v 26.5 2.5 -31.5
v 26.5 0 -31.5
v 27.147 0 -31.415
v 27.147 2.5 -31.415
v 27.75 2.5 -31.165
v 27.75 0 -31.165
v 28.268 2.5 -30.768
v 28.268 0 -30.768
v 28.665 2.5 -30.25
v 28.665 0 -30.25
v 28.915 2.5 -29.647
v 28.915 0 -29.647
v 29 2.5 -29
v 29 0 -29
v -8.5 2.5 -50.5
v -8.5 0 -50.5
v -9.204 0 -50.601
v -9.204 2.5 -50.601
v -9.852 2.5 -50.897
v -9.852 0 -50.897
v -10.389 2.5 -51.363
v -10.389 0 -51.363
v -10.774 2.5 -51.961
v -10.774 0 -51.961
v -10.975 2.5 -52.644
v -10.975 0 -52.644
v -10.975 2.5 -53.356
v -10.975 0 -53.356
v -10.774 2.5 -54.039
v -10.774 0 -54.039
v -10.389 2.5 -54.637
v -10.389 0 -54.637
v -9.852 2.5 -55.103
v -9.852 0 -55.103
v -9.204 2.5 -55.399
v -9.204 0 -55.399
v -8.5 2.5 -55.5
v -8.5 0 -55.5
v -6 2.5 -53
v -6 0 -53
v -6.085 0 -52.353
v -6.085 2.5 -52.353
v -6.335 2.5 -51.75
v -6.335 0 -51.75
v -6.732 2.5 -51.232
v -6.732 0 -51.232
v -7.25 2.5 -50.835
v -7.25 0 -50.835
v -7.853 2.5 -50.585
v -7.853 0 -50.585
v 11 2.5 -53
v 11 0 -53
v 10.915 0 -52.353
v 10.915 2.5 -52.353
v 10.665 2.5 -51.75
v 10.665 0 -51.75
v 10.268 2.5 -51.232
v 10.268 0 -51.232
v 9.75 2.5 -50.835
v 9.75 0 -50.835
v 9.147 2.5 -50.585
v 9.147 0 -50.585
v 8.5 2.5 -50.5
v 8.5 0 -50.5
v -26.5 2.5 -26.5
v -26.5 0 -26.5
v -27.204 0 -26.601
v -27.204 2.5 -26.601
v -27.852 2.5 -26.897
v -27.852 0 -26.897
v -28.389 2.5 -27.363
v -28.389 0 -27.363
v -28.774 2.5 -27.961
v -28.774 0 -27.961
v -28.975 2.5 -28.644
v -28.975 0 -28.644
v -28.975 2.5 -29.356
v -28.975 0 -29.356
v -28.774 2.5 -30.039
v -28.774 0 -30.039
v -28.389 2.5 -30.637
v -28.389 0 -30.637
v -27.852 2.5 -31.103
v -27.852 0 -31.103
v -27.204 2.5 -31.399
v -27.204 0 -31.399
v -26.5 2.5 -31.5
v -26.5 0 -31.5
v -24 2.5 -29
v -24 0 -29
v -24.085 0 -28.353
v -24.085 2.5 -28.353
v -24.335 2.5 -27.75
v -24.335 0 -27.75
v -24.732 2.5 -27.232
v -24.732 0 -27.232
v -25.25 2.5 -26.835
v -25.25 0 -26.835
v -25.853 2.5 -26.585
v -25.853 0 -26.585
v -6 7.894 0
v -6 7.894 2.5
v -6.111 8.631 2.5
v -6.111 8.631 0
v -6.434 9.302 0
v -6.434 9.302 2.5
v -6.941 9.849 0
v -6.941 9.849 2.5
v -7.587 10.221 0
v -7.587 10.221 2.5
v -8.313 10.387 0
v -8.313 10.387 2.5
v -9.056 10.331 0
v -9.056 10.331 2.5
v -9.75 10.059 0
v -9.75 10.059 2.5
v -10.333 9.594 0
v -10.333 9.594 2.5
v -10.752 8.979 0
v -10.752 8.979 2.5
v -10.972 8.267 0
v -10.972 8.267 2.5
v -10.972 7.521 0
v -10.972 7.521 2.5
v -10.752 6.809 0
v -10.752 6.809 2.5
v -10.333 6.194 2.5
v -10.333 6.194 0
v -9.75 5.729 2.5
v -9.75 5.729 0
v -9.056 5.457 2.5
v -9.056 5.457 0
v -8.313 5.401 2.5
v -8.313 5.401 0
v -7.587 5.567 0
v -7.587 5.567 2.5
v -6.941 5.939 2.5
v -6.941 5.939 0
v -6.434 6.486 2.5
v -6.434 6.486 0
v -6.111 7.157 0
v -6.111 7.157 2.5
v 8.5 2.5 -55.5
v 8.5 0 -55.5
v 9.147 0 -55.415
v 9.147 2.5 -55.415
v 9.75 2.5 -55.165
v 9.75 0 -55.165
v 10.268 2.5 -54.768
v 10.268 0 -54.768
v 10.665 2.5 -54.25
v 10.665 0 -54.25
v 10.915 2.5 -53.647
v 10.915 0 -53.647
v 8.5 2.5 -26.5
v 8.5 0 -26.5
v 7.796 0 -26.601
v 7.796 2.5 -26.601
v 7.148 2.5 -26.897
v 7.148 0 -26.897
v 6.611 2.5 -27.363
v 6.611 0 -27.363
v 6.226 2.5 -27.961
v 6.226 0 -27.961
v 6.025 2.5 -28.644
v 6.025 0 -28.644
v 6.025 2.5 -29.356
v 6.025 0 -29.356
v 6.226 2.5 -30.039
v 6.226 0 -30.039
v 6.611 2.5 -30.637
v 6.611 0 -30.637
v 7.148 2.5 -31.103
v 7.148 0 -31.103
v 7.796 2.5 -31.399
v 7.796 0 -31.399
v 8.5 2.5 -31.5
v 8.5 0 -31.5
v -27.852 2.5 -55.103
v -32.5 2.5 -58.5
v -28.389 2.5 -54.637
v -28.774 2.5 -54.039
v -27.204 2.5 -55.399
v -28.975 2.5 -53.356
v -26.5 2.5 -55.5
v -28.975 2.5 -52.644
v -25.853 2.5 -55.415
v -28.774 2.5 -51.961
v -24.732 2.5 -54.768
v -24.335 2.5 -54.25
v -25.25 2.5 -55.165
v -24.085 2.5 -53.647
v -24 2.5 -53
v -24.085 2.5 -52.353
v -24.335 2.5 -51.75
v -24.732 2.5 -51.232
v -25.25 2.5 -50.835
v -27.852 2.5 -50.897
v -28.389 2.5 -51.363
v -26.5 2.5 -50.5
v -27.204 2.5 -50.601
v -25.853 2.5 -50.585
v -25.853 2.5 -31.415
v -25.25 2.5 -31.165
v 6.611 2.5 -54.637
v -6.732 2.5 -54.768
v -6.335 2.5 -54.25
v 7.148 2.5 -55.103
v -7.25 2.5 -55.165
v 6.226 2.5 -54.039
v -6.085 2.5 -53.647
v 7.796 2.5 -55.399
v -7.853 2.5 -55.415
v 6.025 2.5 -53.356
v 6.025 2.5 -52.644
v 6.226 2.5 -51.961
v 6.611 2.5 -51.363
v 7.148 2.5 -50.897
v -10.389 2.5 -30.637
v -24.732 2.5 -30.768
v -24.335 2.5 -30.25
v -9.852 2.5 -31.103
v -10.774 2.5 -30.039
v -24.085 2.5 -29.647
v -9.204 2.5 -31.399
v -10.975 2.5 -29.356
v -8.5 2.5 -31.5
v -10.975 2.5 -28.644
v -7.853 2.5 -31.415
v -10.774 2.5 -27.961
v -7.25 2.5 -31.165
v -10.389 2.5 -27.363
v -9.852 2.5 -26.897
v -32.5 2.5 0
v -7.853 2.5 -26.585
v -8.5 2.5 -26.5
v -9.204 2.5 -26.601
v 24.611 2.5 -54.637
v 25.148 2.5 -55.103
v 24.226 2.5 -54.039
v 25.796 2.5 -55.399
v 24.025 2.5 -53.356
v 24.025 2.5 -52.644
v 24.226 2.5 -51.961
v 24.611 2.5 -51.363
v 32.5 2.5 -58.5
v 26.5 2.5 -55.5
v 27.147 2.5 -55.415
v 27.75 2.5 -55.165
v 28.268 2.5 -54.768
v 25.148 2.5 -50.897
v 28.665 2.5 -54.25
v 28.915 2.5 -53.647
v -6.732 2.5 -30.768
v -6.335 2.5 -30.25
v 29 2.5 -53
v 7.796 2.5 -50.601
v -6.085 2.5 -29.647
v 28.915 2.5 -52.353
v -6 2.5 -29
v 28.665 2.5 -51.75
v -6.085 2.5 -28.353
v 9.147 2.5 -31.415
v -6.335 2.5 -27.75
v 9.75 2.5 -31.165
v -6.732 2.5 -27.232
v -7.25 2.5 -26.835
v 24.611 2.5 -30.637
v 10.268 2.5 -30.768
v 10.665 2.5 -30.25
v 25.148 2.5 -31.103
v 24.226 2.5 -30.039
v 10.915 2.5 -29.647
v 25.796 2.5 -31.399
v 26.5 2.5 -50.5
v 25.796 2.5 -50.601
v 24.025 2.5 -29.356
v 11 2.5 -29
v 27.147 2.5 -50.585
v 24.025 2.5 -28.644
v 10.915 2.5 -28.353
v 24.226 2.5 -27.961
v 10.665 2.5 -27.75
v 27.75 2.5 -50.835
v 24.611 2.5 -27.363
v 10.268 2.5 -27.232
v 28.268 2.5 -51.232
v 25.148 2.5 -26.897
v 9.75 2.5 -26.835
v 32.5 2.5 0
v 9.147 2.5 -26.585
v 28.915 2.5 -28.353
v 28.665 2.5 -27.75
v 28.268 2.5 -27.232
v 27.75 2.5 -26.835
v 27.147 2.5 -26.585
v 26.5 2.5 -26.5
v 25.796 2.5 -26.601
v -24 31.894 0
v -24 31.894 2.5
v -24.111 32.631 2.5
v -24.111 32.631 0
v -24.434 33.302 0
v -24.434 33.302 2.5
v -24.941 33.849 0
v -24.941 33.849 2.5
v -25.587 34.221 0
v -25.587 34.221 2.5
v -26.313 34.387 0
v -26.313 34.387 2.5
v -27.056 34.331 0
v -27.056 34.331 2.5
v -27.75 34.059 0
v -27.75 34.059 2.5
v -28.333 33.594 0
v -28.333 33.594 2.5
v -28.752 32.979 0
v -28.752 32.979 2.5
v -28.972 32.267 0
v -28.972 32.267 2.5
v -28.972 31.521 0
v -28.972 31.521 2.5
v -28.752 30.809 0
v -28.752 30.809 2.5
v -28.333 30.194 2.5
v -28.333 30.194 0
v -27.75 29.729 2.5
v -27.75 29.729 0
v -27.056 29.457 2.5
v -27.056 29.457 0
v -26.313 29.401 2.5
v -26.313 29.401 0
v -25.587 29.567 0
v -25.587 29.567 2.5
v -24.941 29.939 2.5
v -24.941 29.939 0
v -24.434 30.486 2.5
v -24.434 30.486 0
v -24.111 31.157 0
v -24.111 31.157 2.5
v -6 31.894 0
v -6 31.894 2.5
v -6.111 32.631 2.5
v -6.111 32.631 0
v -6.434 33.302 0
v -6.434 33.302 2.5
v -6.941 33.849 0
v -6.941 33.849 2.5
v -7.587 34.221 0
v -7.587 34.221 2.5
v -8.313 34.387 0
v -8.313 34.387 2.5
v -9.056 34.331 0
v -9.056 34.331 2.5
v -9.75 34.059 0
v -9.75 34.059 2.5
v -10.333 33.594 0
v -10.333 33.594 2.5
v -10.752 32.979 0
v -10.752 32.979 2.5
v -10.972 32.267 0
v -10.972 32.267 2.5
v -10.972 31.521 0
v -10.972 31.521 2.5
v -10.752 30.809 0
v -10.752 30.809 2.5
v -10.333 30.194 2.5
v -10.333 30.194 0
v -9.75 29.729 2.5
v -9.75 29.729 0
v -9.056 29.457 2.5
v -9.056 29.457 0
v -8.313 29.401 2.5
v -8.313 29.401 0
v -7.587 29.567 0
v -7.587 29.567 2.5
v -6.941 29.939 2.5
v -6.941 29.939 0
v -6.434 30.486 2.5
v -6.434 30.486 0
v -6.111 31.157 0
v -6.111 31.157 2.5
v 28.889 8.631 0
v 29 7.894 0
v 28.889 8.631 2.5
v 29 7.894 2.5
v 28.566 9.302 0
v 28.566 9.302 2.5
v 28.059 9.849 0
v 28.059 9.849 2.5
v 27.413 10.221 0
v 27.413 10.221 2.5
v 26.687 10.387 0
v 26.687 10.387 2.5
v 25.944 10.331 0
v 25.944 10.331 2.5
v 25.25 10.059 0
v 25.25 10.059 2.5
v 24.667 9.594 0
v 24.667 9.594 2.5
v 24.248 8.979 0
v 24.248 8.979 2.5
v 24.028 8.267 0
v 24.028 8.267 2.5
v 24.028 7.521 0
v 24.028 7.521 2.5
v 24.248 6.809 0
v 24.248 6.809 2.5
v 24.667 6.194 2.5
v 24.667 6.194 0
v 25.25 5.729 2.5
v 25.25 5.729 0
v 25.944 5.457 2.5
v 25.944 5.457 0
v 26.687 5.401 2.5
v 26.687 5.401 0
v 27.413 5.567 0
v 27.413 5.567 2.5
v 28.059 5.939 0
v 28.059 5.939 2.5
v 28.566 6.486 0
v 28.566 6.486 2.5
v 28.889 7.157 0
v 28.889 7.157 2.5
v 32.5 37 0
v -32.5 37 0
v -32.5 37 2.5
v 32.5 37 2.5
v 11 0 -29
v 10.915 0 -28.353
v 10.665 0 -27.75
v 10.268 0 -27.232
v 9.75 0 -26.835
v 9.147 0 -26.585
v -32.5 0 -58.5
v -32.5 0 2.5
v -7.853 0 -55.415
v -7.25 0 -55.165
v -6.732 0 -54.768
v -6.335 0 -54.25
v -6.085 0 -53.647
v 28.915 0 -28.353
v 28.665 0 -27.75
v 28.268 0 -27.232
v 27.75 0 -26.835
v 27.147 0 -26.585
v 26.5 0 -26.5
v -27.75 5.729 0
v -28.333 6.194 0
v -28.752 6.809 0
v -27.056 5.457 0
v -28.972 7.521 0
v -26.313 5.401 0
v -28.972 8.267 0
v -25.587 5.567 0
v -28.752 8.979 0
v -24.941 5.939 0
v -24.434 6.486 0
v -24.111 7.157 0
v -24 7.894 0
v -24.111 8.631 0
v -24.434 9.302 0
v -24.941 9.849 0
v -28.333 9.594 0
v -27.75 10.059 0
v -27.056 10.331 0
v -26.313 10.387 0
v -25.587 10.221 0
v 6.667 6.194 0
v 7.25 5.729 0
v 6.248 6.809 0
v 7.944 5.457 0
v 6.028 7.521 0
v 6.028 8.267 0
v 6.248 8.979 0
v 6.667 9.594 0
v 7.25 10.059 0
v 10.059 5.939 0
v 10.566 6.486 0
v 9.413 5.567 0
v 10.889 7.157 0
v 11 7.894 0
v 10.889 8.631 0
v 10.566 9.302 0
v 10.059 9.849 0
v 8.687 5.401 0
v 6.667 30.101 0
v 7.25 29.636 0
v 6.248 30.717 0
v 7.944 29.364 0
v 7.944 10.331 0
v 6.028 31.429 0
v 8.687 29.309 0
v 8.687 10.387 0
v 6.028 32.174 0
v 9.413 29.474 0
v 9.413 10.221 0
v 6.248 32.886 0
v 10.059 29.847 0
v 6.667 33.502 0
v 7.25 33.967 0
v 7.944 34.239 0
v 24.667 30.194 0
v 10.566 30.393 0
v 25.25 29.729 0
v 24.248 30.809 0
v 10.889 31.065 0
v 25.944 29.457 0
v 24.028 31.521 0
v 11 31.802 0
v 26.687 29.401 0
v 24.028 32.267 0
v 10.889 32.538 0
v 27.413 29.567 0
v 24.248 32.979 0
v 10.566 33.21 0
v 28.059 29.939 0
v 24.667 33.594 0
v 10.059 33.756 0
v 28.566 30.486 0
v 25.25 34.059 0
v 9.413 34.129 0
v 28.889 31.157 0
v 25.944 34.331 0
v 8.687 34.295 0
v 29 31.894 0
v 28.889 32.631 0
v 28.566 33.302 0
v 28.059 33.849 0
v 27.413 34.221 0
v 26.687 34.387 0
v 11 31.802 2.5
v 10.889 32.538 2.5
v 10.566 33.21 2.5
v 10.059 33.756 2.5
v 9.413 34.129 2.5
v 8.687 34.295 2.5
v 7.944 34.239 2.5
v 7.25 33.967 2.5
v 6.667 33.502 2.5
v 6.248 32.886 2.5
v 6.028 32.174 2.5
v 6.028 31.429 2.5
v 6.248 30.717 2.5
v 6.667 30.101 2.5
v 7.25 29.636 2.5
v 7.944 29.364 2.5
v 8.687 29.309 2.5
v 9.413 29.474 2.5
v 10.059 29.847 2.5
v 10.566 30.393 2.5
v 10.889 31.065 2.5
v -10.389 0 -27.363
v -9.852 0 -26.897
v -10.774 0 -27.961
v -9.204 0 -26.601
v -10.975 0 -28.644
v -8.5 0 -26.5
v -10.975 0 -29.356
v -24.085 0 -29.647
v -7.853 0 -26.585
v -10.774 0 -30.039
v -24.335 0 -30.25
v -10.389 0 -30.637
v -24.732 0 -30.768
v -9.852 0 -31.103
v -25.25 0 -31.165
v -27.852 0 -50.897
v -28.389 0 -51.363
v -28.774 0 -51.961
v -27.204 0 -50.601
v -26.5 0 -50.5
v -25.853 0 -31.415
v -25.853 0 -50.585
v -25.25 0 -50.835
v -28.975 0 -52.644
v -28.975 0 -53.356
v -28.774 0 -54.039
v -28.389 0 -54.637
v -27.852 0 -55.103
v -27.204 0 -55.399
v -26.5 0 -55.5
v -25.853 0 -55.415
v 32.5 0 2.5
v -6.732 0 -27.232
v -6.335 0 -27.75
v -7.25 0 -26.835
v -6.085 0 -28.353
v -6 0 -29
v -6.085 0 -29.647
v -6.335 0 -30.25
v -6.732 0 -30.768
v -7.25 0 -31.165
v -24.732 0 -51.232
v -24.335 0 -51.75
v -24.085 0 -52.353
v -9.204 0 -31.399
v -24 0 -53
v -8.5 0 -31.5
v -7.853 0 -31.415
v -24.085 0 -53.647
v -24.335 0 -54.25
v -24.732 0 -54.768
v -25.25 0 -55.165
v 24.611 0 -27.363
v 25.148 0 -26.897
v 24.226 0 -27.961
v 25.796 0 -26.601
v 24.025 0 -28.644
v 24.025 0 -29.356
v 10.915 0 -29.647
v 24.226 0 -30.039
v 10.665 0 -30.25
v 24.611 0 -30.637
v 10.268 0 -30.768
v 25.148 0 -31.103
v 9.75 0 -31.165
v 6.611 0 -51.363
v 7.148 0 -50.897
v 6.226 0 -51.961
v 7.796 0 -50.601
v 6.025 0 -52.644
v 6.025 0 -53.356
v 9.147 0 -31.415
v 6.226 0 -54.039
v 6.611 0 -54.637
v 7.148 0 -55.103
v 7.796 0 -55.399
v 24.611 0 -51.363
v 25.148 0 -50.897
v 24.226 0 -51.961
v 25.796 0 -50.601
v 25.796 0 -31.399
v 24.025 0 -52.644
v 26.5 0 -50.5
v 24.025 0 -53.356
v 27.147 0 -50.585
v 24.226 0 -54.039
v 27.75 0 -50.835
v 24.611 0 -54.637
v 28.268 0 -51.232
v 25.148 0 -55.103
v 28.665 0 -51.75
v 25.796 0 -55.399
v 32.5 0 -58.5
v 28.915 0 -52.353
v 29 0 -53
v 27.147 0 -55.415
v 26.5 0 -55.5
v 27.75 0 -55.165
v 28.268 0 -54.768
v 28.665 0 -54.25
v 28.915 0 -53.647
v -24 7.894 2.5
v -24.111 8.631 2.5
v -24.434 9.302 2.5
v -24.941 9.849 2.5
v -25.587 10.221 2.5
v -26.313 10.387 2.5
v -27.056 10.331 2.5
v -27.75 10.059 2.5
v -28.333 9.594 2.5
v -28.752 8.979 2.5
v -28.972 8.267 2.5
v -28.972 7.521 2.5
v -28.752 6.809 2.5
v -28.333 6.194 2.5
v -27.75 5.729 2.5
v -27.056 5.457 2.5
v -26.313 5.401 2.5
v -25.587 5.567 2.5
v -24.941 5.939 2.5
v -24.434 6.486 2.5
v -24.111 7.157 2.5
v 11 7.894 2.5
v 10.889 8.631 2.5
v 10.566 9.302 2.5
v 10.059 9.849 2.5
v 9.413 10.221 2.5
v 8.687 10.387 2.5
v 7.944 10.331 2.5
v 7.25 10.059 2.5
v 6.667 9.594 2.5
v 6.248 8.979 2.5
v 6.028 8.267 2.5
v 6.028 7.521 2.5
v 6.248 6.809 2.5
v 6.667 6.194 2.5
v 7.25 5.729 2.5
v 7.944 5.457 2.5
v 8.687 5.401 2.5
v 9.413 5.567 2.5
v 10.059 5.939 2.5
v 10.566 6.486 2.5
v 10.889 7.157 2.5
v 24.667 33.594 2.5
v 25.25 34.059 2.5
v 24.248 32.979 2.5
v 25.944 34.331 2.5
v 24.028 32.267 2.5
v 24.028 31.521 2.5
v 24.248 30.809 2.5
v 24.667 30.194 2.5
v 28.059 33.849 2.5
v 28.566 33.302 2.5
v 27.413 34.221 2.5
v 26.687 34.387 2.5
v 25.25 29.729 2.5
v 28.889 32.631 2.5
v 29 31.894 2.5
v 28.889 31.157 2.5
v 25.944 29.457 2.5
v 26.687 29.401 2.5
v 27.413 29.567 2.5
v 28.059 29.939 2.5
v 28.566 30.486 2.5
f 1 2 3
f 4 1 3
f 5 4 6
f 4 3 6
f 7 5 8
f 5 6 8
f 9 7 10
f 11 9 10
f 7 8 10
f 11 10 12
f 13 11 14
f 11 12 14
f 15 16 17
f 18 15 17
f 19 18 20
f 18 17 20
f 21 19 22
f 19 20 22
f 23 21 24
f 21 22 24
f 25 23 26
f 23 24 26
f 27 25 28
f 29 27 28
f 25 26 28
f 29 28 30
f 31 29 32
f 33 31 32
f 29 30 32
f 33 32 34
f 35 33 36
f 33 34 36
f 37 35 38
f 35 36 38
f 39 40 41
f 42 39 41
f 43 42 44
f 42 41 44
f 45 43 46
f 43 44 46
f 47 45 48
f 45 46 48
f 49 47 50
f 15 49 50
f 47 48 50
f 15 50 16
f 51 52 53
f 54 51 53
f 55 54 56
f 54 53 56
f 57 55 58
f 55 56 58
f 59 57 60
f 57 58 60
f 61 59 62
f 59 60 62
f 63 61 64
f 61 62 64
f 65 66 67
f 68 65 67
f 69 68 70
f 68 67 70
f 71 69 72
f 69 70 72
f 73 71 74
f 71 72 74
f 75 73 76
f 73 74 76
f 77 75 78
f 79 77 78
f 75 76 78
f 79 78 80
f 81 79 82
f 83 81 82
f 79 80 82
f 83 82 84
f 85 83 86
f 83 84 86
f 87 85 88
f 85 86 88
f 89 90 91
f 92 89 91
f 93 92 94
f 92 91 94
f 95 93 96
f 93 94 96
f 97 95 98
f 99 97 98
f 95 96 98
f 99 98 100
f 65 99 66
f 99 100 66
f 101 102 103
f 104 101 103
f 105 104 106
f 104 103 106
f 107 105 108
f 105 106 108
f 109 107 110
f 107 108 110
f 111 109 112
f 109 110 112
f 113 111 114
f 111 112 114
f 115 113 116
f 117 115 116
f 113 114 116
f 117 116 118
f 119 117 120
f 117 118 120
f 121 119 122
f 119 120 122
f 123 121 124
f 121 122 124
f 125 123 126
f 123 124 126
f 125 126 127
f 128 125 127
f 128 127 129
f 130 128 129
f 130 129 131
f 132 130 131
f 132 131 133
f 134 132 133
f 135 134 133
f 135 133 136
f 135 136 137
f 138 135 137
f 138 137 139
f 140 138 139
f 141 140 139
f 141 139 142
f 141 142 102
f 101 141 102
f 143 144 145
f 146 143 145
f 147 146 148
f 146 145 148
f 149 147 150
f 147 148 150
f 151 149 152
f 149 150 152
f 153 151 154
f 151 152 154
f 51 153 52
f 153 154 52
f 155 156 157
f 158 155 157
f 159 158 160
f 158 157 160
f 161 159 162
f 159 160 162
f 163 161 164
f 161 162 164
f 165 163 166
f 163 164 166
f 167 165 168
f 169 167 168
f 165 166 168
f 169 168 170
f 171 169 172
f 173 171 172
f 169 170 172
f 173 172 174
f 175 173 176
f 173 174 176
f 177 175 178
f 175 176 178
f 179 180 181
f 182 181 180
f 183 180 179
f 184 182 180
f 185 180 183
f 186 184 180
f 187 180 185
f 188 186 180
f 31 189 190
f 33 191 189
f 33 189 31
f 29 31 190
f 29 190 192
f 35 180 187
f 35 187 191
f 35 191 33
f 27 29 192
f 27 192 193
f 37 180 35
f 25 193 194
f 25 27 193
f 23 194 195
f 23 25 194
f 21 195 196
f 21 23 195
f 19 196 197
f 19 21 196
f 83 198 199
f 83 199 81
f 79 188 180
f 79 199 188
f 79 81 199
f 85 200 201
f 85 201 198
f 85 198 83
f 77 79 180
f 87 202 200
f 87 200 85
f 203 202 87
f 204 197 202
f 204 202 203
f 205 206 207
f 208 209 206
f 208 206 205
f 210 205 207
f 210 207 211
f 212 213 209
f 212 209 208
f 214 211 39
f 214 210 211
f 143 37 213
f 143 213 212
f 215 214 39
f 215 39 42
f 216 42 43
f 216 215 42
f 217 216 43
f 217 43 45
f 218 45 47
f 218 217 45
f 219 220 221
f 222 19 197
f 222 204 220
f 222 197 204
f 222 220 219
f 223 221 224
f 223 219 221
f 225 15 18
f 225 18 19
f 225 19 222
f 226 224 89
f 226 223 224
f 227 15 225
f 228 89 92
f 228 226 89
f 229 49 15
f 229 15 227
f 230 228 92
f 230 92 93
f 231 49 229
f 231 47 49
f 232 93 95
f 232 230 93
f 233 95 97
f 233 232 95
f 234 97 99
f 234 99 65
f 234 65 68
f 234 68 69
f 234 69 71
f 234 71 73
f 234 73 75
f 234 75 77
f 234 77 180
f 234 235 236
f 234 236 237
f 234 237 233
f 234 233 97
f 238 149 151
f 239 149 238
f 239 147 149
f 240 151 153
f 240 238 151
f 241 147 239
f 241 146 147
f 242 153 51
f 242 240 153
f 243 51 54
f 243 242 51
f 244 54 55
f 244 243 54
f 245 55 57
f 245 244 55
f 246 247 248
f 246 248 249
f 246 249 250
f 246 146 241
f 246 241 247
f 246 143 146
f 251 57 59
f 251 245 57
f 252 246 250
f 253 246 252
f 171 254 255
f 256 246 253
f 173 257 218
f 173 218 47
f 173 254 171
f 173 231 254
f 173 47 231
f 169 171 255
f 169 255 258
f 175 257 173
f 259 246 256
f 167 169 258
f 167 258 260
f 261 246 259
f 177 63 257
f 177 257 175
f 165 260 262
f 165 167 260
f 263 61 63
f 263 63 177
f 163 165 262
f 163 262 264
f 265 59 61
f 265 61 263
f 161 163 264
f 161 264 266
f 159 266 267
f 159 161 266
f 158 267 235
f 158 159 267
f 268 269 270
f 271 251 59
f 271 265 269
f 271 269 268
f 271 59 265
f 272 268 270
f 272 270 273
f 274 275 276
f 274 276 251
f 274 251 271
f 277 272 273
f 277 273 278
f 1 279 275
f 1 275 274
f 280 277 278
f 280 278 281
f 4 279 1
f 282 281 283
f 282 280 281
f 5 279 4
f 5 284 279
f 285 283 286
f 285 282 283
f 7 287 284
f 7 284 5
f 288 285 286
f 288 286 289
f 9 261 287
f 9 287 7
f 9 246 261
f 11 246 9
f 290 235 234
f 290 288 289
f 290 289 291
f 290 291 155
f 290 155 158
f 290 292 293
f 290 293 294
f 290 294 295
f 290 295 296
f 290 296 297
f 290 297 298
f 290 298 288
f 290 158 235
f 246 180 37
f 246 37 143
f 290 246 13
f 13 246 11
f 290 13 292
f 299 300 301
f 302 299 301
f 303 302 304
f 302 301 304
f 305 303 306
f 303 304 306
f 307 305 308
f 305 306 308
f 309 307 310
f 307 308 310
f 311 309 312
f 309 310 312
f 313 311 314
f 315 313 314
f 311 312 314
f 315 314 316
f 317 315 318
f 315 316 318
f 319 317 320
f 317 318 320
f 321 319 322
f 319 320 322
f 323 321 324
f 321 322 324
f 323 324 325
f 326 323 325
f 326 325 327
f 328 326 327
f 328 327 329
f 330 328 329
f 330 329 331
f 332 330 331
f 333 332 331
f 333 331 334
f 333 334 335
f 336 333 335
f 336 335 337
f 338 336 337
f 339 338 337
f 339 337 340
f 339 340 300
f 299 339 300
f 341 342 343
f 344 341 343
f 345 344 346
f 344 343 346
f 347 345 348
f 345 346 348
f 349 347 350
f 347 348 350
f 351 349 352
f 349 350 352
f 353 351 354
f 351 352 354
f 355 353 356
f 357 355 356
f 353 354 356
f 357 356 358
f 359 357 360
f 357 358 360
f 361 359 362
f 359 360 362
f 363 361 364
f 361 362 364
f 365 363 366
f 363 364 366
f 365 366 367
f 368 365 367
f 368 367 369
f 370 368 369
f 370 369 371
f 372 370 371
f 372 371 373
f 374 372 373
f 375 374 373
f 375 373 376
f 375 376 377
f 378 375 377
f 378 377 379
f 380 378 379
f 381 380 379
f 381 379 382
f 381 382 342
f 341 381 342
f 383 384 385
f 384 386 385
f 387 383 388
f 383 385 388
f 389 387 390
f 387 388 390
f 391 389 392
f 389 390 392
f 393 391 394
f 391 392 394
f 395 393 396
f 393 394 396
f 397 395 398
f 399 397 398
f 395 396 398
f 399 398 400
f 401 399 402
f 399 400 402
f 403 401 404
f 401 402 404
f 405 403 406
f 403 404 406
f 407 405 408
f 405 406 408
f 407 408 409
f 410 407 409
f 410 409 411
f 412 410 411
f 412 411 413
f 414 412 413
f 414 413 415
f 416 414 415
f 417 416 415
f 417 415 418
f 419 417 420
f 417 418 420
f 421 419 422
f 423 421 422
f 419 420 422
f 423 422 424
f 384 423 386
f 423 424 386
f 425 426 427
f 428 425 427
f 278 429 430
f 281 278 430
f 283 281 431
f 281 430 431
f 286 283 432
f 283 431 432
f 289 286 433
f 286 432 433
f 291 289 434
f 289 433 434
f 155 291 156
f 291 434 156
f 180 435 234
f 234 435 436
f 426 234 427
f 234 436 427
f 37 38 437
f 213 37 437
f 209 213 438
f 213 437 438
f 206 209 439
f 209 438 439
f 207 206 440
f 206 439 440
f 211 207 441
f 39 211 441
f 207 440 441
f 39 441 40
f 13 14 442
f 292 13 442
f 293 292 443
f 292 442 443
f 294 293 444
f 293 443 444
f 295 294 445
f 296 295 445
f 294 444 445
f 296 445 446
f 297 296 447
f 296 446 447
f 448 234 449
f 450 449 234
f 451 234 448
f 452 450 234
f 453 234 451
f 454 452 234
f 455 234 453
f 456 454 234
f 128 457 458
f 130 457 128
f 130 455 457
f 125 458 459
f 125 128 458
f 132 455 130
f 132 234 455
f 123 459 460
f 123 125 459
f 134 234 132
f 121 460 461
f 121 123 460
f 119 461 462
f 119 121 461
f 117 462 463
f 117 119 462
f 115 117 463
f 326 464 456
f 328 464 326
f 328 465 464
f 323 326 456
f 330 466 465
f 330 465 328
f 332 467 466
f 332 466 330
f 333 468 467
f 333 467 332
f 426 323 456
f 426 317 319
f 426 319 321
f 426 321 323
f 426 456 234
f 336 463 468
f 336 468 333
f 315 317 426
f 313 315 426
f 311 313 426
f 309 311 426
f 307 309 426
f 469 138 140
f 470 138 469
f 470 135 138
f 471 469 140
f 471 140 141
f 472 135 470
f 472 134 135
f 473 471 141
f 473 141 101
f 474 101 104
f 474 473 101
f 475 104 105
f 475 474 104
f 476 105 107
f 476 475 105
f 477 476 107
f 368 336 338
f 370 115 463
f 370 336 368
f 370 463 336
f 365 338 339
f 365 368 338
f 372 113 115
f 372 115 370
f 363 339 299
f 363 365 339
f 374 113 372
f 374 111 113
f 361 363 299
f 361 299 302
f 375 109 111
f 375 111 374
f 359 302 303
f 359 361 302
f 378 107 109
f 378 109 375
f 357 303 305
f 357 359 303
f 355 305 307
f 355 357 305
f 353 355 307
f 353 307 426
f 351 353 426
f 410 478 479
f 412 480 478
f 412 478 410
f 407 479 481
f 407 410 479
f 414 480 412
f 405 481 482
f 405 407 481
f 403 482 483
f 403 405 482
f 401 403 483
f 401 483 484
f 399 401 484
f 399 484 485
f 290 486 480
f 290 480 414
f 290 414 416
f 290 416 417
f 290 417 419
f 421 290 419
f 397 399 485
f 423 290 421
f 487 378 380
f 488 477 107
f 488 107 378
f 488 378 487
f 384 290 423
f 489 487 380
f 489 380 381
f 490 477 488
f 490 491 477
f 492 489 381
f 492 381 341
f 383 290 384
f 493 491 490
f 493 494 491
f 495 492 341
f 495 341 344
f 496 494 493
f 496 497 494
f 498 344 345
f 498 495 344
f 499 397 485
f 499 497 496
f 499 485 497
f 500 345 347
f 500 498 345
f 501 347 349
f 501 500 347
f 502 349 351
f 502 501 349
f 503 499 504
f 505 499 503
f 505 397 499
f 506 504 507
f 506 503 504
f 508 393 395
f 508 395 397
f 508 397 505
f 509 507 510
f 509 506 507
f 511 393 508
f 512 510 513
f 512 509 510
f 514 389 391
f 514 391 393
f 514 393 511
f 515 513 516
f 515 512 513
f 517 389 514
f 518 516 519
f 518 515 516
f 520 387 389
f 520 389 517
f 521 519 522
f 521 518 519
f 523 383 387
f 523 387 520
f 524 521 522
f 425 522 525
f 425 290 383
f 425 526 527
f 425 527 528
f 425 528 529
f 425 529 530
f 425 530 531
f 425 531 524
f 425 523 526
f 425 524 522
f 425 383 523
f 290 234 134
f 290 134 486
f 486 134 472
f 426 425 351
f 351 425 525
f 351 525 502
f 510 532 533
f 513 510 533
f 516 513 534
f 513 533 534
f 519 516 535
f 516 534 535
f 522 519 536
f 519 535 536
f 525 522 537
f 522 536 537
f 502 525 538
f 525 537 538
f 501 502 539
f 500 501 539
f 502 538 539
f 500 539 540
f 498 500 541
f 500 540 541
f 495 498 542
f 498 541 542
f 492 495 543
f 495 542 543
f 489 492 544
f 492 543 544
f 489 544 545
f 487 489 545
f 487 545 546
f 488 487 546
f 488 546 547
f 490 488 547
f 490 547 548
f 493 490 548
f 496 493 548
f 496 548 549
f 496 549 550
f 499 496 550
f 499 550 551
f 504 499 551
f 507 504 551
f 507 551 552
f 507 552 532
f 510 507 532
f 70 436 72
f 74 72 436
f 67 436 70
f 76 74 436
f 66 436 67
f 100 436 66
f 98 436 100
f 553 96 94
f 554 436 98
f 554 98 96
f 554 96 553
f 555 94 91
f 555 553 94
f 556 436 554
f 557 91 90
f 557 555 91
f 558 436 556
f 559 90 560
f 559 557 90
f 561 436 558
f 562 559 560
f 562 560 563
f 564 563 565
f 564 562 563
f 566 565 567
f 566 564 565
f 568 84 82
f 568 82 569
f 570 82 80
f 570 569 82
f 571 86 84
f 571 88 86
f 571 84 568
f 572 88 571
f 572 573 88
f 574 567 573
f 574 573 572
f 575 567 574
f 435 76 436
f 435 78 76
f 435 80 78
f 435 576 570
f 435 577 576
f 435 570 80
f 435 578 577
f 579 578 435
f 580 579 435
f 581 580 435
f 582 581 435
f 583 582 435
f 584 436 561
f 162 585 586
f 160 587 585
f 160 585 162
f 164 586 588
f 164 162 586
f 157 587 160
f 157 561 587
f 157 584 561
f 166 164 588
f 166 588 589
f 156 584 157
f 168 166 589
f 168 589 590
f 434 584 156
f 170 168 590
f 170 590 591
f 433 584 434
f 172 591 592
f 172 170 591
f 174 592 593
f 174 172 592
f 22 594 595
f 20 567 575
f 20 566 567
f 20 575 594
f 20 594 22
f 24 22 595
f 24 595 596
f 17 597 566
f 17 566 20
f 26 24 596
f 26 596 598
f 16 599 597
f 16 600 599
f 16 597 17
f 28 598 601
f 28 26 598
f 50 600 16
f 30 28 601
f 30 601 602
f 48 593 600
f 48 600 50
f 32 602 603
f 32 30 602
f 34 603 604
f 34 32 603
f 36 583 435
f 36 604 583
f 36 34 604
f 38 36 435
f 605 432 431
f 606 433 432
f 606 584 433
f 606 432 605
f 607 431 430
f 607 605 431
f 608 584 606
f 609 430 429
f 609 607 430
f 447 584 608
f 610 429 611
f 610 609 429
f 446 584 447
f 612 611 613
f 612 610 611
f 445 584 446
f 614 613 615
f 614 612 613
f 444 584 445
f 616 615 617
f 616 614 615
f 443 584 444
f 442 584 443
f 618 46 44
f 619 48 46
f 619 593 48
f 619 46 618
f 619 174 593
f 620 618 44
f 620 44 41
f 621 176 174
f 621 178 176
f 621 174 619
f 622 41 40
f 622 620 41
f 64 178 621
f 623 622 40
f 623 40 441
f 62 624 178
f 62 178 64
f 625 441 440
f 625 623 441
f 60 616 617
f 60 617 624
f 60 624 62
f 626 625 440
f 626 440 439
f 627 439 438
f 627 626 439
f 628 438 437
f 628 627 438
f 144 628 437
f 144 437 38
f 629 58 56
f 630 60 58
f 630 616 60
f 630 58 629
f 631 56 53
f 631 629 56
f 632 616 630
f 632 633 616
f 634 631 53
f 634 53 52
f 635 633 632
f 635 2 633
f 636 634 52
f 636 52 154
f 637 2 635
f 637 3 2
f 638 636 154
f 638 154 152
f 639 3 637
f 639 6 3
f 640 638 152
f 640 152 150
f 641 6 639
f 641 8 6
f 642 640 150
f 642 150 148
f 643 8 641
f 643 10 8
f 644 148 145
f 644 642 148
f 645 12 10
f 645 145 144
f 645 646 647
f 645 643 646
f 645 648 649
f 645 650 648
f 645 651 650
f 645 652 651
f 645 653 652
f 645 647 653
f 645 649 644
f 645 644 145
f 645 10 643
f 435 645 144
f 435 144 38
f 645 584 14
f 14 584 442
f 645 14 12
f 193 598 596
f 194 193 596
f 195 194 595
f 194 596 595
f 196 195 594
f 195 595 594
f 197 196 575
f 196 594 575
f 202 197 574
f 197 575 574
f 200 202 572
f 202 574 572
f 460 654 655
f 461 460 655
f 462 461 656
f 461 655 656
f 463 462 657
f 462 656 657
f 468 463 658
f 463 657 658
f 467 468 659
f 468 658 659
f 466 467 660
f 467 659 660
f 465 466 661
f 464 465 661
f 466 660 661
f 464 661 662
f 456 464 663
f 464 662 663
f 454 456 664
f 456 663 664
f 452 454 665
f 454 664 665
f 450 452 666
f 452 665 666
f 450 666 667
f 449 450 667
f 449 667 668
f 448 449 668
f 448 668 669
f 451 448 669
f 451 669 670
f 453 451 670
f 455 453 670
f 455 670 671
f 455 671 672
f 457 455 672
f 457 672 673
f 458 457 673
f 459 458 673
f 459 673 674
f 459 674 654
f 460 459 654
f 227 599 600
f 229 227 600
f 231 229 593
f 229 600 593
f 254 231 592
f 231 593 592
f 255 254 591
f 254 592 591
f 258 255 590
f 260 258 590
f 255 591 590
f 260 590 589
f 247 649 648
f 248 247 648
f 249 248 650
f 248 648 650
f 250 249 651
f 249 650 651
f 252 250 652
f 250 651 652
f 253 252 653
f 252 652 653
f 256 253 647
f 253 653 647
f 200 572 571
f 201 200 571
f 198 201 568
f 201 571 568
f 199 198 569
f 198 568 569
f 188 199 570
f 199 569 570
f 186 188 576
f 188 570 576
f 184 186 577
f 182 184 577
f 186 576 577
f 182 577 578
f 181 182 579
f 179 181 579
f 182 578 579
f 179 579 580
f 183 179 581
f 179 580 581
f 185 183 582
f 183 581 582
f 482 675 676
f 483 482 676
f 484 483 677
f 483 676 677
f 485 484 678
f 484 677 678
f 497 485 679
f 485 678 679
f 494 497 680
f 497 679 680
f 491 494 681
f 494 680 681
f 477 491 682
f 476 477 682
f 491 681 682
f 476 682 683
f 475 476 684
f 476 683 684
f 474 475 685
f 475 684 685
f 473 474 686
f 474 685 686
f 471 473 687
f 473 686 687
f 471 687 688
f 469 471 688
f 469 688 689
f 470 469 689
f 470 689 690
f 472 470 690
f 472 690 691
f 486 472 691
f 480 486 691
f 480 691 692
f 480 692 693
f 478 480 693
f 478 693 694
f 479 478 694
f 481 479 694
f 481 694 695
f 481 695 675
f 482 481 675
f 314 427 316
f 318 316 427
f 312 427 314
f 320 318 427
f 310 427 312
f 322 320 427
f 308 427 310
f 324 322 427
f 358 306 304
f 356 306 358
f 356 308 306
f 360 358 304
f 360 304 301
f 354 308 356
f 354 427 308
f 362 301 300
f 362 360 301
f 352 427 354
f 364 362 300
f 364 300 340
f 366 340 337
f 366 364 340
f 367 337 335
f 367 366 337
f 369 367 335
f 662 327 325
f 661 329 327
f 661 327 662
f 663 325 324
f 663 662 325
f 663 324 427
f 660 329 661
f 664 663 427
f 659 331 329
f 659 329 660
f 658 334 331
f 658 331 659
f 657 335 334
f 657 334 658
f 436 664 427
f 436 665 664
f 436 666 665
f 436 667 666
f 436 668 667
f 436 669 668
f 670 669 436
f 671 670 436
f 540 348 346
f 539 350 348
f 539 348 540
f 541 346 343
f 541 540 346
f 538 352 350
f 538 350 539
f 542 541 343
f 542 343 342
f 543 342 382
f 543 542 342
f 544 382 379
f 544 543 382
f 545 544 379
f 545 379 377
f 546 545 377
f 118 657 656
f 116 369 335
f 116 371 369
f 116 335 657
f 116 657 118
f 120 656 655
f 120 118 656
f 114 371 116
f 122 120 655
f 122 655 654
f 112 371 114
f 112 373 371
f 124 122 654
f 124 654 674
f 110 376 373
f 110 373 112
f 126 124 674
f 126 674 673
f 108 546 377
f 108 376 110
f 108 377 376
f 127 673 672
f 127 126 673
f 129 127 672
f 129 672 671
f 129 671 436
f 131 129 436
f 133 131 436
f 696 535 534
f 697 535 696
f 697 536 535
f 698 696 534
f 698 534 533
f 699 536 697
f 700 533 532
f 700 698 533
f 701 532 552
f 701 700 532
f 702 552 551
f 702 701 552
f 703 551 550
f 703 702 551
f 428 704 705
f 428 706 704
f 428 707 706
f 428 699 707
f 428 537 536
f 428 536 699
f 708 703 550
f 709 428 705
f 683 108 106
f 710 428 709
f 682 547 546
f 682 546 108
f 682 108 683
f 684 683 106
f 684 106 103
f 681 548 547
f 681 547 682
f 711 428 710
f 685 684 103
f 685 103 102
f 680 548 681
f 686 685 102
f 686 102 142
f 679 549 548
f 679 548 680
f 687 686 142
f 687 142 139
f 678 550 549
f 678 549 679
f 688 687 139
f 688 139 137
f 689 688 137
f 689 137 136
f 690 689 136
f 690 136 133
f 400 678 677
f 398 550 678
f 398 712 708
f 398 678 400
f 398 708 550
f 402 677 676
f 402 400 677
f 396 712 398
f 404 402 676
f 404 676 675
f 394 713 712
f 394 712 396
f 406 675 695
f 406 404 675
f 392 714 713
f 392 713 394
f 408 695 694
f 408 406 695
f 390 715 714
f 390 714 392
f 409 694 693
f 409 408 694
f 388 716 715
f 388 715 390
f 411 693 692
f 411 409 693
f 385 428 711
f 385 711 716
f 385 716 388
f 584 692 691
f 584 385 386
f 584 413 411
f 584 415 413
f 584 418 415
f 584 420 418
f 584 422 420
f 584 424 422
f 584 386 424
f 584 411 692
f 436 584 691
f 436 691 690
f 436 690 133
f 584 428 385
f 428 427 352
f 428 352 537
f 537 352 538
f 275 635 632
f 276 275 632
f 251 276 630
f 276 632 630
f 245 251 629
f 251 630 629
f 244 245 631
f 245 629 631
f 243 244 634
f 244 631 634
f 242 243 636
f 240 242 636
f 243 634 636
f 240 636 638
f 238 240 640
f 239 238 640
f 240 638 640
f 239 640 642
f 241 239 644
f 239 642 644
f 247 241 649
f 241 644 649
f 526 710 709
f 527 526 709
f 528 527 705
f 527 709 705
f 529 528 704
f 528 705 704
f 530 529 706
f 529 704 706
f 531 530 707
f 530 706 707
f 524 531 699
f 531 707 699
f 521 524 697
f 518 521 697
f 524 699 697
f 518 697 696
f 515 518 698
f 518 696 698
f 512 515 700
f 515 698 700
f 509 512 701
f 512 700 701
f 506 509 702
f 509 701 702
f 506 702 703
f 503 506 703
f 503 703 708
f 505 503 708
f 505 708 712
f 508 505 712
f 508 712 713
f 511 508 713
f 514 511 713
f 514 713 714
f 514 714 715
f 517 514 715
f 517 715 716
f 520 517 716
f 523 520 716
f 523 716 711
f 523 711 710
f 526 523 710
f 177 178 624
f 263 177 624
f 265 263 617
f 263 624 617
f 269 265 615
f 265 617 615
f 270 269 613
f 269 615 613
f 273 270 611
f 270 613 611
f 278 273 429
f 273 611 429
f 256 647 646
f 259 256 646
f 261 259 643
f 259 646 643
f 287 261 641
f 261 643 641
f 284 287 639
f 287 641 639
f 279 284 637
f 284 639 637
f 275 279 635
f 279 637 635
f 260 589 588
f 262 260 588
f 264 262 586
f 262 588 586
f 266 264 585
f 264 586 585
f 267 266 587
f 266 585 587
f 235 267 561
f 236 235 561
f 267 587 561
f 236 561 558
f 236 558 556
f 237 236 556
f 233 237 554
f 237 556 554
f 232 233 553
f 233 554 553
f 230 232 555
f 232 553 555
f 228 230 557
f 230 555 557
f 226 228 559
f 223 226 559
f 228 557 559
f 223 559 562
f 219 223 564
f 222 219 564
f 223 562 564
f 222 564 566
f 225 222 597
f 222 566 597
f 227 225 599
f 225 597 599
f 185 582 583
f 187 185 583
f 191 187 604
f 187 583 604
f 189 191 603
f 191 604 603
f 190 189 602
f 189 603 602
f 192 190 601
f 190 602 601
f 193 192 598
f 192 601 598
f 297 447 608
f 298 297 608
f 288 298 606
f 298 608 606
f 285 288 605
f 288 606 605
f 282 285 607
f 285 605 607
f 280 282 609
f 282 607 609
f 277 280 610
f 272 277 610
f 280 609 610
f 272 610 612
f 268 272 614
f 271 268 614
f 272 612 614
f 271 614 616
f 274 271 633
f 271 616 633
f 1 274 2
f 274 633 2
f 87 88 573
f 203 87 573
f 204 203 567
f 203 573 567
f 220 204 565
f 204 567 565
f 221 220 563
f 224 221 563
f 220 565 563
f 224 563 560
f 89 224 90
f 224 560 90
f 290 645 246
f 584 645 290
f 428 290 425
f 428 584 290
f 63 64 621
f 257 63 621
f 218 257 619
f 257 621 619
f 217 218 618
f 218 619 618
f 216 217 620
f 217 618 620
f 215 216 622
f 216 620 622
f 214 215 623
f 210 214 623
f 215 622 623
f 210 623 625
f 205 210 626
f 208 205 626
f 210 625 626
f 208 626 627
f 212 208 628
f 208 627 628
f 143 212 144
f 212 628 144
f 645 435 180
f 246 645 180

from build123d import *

# Parameters (mm, degrees)
F0_W     = 2.5
F0_H     = 58.5
F1_DEPTH = 32.5
F3_DEPTH = 5
F4_R     = 2.5
F5_DEPTH = 5


with BuildPart() as f1:
    # F0 (on Right) → F1 (new body, symmetric)
    with BuildSketch(Plane.YZ):
        Polygon((0, 2.5), (0, 0), (2.5, 0), (37, 0), (37, 2.5), align=None)
        with Locations((1.25, -29.25)):
            Rectangle(F0_W, F0_H)
    extrude(amount=F1_DEPTH, both=True)

    # F2 (on Front) → F3 (cut, symmetric)
    with BuildSketch(Plane.XZ):
        with BuildLine():
            Line((-26.5, -31.5), (-26.5, -26.5))
            ThreePointArc((-26.5, -26.5), (-29, -29), (-26.5, -31.5))
        make_face()
        with BuildLine():
            ThreePointArc((-26.5, -31.5), (-24.732233047, -30.767766953), (-24, -29))
            ThreePointArc((-24, -29), (-24.732233047, -27.232233047), (-26.5, -26.5))
            Line((-26.5, -26.5), (-26.5, -31.5))
        make_face()
        with BuildLine():
            Line((-8.5, -31.5), (-8.5, -26.5))
            ThreePointArc((-8.5, -26.5), (-11, -29), (-8.5, -31.5))
        make_face()
        with BuildLine():
            ThreePointArc((-8.5, -31.5), (-6.732233047, -30.767766953), (-6, -29))
            ThreePointArc((-6, -29), (-6.732233047, -27.232233047), (-8.5, -26.5))
            Line((-8.5, -26.5), (-8.5, -31.5))
        make_face()
        with BuildLine():
            Line((8.5, -31.5), (8.5, -26.5))
            ThreePointArc((8.5, -26.5), (6, -29), (8.5, -31.5))
        make_face()
        with BuildLine():
            ThreePointArc((8.5, -31.5), (10.267766953, -30.767766953), (11, -29))
            ThreePointArc((11, -29), (10.267766953, -27.232233047), (8.5, -26.5))
            Line((8.5, -26.5), (8.5, -31.5))
        make_face()
        with BuildLine():
            Line((26.5, -31.5), (26.5, -26.5))
            ThreePointArc((26.5, -26.5), (24, -29), (26.5, -31.5))
        make_face()
        with BuildLine():
            ThreePointArc((26.5, -31.5), (28.267766953, -30.767766953), (29, -29))
            ThreePointArc((29, -29), (28.267766953, -27.232233047), (26.5, -26.5))
            Line((26.5, -26.5), (26.5, -31.5))
        make_face()
        with BuildLine():
            Line((-26.5, -55.5), (-26.5, -50.5))
            ThreePointArc((-26.5, -50.5), (-29, -53), (-26.5, -55.5))
        make_face()
        with BuildLine():
            ThreePointArc((-24, -53), (-24.732233047, -51.232233047), (-26.5, -50.5))
            Line((-26.5, -50.5), (-26.5, -55.5))
            ThreePointArc((-26.5, -55.5), (-24.732233047, -54.767766953), (-24, -53))
        make_face()
        with BuildLine():
            ThreePointArc((-6, -53), (-6.732233047, -51.232233047), (-8.5, -50.5))
            Line((-8.5, -50.5), (-8.5, -55.5))
            ThreePointArc((-8.5, -55.5), (-6.732233047, -54.767766953), (-6, -53))
        make_face()
        with BuildLine():
            Line((-8.5, -55.5), (-8.5, -50.5))
            ThreePointArc((-8.5, -50.5), (-11, -53), (-8.5, -55.5))
        make_face()
        with BuildLine():
            ThreePointArc((11, -53), (10.267766953, -51.232233047), (8.5, -50.5))
            Line((8.5, -50.5), (8.5, -55.5))
            ThreePointArc((8.5, -55.5), (10.267766953, -54.767766953), (11, -53))
        make_face()
        with BuildLine():
            Line((8.5, -55.5), (8.5, -50.5))
            ThreePointArc((8.5, -50.5), (6, -53), (8.5, -55.5))
        make_face()
        with BuildLine():
            ThreePointArc((29, -53), (28.267766953, -51.232233047), (26.5, -50.5))
            Line((26.5, -50.5), (26.5, -55.5))
            ThreePointArc((26.5, -55.5), (28.267766953, -54.767766953), (29, -53))
        make_face()
        with BuildLine():
            Line((26.5, -55.5), (26.5, -50.5))
            ThreePointArc((26.5, -50.5), (24, -53), (26.5, -55.5))
        make_face()
    extrude(amount=F3_DEPTH, both=True, mode=Mode.SUBTRACT)

    # F4 (on face) → F5 (cut, symmetric)
    with BuildSketch(Plane.XY.offset(2.5)):
        with Locations((-26.5, 7.894)):
            Circle(F4_R)
        with Locations((-26.5, 31.894)):
            Circle(F4_R)
        with Locations((-8.5, 31.894)):
            Circle(F4_R)
        with Locations((-8.5, 7.894)):
            Circle(F4_R)
        with Locations((8.5, 7.894)):
            Circle(F4_R)
        with Locations((8.5, 31.8015553057)):
            Circle(F4_R)
        with Locations((26.5, 31.894)):
            Circle(F4_R)
        with Locations((26.5, 7.894)):
            Circle(F4_R)
    extrude(amount=F5_DEPTH, both=True, mode=Mode.SUBTRACT)


solid = f1.part
